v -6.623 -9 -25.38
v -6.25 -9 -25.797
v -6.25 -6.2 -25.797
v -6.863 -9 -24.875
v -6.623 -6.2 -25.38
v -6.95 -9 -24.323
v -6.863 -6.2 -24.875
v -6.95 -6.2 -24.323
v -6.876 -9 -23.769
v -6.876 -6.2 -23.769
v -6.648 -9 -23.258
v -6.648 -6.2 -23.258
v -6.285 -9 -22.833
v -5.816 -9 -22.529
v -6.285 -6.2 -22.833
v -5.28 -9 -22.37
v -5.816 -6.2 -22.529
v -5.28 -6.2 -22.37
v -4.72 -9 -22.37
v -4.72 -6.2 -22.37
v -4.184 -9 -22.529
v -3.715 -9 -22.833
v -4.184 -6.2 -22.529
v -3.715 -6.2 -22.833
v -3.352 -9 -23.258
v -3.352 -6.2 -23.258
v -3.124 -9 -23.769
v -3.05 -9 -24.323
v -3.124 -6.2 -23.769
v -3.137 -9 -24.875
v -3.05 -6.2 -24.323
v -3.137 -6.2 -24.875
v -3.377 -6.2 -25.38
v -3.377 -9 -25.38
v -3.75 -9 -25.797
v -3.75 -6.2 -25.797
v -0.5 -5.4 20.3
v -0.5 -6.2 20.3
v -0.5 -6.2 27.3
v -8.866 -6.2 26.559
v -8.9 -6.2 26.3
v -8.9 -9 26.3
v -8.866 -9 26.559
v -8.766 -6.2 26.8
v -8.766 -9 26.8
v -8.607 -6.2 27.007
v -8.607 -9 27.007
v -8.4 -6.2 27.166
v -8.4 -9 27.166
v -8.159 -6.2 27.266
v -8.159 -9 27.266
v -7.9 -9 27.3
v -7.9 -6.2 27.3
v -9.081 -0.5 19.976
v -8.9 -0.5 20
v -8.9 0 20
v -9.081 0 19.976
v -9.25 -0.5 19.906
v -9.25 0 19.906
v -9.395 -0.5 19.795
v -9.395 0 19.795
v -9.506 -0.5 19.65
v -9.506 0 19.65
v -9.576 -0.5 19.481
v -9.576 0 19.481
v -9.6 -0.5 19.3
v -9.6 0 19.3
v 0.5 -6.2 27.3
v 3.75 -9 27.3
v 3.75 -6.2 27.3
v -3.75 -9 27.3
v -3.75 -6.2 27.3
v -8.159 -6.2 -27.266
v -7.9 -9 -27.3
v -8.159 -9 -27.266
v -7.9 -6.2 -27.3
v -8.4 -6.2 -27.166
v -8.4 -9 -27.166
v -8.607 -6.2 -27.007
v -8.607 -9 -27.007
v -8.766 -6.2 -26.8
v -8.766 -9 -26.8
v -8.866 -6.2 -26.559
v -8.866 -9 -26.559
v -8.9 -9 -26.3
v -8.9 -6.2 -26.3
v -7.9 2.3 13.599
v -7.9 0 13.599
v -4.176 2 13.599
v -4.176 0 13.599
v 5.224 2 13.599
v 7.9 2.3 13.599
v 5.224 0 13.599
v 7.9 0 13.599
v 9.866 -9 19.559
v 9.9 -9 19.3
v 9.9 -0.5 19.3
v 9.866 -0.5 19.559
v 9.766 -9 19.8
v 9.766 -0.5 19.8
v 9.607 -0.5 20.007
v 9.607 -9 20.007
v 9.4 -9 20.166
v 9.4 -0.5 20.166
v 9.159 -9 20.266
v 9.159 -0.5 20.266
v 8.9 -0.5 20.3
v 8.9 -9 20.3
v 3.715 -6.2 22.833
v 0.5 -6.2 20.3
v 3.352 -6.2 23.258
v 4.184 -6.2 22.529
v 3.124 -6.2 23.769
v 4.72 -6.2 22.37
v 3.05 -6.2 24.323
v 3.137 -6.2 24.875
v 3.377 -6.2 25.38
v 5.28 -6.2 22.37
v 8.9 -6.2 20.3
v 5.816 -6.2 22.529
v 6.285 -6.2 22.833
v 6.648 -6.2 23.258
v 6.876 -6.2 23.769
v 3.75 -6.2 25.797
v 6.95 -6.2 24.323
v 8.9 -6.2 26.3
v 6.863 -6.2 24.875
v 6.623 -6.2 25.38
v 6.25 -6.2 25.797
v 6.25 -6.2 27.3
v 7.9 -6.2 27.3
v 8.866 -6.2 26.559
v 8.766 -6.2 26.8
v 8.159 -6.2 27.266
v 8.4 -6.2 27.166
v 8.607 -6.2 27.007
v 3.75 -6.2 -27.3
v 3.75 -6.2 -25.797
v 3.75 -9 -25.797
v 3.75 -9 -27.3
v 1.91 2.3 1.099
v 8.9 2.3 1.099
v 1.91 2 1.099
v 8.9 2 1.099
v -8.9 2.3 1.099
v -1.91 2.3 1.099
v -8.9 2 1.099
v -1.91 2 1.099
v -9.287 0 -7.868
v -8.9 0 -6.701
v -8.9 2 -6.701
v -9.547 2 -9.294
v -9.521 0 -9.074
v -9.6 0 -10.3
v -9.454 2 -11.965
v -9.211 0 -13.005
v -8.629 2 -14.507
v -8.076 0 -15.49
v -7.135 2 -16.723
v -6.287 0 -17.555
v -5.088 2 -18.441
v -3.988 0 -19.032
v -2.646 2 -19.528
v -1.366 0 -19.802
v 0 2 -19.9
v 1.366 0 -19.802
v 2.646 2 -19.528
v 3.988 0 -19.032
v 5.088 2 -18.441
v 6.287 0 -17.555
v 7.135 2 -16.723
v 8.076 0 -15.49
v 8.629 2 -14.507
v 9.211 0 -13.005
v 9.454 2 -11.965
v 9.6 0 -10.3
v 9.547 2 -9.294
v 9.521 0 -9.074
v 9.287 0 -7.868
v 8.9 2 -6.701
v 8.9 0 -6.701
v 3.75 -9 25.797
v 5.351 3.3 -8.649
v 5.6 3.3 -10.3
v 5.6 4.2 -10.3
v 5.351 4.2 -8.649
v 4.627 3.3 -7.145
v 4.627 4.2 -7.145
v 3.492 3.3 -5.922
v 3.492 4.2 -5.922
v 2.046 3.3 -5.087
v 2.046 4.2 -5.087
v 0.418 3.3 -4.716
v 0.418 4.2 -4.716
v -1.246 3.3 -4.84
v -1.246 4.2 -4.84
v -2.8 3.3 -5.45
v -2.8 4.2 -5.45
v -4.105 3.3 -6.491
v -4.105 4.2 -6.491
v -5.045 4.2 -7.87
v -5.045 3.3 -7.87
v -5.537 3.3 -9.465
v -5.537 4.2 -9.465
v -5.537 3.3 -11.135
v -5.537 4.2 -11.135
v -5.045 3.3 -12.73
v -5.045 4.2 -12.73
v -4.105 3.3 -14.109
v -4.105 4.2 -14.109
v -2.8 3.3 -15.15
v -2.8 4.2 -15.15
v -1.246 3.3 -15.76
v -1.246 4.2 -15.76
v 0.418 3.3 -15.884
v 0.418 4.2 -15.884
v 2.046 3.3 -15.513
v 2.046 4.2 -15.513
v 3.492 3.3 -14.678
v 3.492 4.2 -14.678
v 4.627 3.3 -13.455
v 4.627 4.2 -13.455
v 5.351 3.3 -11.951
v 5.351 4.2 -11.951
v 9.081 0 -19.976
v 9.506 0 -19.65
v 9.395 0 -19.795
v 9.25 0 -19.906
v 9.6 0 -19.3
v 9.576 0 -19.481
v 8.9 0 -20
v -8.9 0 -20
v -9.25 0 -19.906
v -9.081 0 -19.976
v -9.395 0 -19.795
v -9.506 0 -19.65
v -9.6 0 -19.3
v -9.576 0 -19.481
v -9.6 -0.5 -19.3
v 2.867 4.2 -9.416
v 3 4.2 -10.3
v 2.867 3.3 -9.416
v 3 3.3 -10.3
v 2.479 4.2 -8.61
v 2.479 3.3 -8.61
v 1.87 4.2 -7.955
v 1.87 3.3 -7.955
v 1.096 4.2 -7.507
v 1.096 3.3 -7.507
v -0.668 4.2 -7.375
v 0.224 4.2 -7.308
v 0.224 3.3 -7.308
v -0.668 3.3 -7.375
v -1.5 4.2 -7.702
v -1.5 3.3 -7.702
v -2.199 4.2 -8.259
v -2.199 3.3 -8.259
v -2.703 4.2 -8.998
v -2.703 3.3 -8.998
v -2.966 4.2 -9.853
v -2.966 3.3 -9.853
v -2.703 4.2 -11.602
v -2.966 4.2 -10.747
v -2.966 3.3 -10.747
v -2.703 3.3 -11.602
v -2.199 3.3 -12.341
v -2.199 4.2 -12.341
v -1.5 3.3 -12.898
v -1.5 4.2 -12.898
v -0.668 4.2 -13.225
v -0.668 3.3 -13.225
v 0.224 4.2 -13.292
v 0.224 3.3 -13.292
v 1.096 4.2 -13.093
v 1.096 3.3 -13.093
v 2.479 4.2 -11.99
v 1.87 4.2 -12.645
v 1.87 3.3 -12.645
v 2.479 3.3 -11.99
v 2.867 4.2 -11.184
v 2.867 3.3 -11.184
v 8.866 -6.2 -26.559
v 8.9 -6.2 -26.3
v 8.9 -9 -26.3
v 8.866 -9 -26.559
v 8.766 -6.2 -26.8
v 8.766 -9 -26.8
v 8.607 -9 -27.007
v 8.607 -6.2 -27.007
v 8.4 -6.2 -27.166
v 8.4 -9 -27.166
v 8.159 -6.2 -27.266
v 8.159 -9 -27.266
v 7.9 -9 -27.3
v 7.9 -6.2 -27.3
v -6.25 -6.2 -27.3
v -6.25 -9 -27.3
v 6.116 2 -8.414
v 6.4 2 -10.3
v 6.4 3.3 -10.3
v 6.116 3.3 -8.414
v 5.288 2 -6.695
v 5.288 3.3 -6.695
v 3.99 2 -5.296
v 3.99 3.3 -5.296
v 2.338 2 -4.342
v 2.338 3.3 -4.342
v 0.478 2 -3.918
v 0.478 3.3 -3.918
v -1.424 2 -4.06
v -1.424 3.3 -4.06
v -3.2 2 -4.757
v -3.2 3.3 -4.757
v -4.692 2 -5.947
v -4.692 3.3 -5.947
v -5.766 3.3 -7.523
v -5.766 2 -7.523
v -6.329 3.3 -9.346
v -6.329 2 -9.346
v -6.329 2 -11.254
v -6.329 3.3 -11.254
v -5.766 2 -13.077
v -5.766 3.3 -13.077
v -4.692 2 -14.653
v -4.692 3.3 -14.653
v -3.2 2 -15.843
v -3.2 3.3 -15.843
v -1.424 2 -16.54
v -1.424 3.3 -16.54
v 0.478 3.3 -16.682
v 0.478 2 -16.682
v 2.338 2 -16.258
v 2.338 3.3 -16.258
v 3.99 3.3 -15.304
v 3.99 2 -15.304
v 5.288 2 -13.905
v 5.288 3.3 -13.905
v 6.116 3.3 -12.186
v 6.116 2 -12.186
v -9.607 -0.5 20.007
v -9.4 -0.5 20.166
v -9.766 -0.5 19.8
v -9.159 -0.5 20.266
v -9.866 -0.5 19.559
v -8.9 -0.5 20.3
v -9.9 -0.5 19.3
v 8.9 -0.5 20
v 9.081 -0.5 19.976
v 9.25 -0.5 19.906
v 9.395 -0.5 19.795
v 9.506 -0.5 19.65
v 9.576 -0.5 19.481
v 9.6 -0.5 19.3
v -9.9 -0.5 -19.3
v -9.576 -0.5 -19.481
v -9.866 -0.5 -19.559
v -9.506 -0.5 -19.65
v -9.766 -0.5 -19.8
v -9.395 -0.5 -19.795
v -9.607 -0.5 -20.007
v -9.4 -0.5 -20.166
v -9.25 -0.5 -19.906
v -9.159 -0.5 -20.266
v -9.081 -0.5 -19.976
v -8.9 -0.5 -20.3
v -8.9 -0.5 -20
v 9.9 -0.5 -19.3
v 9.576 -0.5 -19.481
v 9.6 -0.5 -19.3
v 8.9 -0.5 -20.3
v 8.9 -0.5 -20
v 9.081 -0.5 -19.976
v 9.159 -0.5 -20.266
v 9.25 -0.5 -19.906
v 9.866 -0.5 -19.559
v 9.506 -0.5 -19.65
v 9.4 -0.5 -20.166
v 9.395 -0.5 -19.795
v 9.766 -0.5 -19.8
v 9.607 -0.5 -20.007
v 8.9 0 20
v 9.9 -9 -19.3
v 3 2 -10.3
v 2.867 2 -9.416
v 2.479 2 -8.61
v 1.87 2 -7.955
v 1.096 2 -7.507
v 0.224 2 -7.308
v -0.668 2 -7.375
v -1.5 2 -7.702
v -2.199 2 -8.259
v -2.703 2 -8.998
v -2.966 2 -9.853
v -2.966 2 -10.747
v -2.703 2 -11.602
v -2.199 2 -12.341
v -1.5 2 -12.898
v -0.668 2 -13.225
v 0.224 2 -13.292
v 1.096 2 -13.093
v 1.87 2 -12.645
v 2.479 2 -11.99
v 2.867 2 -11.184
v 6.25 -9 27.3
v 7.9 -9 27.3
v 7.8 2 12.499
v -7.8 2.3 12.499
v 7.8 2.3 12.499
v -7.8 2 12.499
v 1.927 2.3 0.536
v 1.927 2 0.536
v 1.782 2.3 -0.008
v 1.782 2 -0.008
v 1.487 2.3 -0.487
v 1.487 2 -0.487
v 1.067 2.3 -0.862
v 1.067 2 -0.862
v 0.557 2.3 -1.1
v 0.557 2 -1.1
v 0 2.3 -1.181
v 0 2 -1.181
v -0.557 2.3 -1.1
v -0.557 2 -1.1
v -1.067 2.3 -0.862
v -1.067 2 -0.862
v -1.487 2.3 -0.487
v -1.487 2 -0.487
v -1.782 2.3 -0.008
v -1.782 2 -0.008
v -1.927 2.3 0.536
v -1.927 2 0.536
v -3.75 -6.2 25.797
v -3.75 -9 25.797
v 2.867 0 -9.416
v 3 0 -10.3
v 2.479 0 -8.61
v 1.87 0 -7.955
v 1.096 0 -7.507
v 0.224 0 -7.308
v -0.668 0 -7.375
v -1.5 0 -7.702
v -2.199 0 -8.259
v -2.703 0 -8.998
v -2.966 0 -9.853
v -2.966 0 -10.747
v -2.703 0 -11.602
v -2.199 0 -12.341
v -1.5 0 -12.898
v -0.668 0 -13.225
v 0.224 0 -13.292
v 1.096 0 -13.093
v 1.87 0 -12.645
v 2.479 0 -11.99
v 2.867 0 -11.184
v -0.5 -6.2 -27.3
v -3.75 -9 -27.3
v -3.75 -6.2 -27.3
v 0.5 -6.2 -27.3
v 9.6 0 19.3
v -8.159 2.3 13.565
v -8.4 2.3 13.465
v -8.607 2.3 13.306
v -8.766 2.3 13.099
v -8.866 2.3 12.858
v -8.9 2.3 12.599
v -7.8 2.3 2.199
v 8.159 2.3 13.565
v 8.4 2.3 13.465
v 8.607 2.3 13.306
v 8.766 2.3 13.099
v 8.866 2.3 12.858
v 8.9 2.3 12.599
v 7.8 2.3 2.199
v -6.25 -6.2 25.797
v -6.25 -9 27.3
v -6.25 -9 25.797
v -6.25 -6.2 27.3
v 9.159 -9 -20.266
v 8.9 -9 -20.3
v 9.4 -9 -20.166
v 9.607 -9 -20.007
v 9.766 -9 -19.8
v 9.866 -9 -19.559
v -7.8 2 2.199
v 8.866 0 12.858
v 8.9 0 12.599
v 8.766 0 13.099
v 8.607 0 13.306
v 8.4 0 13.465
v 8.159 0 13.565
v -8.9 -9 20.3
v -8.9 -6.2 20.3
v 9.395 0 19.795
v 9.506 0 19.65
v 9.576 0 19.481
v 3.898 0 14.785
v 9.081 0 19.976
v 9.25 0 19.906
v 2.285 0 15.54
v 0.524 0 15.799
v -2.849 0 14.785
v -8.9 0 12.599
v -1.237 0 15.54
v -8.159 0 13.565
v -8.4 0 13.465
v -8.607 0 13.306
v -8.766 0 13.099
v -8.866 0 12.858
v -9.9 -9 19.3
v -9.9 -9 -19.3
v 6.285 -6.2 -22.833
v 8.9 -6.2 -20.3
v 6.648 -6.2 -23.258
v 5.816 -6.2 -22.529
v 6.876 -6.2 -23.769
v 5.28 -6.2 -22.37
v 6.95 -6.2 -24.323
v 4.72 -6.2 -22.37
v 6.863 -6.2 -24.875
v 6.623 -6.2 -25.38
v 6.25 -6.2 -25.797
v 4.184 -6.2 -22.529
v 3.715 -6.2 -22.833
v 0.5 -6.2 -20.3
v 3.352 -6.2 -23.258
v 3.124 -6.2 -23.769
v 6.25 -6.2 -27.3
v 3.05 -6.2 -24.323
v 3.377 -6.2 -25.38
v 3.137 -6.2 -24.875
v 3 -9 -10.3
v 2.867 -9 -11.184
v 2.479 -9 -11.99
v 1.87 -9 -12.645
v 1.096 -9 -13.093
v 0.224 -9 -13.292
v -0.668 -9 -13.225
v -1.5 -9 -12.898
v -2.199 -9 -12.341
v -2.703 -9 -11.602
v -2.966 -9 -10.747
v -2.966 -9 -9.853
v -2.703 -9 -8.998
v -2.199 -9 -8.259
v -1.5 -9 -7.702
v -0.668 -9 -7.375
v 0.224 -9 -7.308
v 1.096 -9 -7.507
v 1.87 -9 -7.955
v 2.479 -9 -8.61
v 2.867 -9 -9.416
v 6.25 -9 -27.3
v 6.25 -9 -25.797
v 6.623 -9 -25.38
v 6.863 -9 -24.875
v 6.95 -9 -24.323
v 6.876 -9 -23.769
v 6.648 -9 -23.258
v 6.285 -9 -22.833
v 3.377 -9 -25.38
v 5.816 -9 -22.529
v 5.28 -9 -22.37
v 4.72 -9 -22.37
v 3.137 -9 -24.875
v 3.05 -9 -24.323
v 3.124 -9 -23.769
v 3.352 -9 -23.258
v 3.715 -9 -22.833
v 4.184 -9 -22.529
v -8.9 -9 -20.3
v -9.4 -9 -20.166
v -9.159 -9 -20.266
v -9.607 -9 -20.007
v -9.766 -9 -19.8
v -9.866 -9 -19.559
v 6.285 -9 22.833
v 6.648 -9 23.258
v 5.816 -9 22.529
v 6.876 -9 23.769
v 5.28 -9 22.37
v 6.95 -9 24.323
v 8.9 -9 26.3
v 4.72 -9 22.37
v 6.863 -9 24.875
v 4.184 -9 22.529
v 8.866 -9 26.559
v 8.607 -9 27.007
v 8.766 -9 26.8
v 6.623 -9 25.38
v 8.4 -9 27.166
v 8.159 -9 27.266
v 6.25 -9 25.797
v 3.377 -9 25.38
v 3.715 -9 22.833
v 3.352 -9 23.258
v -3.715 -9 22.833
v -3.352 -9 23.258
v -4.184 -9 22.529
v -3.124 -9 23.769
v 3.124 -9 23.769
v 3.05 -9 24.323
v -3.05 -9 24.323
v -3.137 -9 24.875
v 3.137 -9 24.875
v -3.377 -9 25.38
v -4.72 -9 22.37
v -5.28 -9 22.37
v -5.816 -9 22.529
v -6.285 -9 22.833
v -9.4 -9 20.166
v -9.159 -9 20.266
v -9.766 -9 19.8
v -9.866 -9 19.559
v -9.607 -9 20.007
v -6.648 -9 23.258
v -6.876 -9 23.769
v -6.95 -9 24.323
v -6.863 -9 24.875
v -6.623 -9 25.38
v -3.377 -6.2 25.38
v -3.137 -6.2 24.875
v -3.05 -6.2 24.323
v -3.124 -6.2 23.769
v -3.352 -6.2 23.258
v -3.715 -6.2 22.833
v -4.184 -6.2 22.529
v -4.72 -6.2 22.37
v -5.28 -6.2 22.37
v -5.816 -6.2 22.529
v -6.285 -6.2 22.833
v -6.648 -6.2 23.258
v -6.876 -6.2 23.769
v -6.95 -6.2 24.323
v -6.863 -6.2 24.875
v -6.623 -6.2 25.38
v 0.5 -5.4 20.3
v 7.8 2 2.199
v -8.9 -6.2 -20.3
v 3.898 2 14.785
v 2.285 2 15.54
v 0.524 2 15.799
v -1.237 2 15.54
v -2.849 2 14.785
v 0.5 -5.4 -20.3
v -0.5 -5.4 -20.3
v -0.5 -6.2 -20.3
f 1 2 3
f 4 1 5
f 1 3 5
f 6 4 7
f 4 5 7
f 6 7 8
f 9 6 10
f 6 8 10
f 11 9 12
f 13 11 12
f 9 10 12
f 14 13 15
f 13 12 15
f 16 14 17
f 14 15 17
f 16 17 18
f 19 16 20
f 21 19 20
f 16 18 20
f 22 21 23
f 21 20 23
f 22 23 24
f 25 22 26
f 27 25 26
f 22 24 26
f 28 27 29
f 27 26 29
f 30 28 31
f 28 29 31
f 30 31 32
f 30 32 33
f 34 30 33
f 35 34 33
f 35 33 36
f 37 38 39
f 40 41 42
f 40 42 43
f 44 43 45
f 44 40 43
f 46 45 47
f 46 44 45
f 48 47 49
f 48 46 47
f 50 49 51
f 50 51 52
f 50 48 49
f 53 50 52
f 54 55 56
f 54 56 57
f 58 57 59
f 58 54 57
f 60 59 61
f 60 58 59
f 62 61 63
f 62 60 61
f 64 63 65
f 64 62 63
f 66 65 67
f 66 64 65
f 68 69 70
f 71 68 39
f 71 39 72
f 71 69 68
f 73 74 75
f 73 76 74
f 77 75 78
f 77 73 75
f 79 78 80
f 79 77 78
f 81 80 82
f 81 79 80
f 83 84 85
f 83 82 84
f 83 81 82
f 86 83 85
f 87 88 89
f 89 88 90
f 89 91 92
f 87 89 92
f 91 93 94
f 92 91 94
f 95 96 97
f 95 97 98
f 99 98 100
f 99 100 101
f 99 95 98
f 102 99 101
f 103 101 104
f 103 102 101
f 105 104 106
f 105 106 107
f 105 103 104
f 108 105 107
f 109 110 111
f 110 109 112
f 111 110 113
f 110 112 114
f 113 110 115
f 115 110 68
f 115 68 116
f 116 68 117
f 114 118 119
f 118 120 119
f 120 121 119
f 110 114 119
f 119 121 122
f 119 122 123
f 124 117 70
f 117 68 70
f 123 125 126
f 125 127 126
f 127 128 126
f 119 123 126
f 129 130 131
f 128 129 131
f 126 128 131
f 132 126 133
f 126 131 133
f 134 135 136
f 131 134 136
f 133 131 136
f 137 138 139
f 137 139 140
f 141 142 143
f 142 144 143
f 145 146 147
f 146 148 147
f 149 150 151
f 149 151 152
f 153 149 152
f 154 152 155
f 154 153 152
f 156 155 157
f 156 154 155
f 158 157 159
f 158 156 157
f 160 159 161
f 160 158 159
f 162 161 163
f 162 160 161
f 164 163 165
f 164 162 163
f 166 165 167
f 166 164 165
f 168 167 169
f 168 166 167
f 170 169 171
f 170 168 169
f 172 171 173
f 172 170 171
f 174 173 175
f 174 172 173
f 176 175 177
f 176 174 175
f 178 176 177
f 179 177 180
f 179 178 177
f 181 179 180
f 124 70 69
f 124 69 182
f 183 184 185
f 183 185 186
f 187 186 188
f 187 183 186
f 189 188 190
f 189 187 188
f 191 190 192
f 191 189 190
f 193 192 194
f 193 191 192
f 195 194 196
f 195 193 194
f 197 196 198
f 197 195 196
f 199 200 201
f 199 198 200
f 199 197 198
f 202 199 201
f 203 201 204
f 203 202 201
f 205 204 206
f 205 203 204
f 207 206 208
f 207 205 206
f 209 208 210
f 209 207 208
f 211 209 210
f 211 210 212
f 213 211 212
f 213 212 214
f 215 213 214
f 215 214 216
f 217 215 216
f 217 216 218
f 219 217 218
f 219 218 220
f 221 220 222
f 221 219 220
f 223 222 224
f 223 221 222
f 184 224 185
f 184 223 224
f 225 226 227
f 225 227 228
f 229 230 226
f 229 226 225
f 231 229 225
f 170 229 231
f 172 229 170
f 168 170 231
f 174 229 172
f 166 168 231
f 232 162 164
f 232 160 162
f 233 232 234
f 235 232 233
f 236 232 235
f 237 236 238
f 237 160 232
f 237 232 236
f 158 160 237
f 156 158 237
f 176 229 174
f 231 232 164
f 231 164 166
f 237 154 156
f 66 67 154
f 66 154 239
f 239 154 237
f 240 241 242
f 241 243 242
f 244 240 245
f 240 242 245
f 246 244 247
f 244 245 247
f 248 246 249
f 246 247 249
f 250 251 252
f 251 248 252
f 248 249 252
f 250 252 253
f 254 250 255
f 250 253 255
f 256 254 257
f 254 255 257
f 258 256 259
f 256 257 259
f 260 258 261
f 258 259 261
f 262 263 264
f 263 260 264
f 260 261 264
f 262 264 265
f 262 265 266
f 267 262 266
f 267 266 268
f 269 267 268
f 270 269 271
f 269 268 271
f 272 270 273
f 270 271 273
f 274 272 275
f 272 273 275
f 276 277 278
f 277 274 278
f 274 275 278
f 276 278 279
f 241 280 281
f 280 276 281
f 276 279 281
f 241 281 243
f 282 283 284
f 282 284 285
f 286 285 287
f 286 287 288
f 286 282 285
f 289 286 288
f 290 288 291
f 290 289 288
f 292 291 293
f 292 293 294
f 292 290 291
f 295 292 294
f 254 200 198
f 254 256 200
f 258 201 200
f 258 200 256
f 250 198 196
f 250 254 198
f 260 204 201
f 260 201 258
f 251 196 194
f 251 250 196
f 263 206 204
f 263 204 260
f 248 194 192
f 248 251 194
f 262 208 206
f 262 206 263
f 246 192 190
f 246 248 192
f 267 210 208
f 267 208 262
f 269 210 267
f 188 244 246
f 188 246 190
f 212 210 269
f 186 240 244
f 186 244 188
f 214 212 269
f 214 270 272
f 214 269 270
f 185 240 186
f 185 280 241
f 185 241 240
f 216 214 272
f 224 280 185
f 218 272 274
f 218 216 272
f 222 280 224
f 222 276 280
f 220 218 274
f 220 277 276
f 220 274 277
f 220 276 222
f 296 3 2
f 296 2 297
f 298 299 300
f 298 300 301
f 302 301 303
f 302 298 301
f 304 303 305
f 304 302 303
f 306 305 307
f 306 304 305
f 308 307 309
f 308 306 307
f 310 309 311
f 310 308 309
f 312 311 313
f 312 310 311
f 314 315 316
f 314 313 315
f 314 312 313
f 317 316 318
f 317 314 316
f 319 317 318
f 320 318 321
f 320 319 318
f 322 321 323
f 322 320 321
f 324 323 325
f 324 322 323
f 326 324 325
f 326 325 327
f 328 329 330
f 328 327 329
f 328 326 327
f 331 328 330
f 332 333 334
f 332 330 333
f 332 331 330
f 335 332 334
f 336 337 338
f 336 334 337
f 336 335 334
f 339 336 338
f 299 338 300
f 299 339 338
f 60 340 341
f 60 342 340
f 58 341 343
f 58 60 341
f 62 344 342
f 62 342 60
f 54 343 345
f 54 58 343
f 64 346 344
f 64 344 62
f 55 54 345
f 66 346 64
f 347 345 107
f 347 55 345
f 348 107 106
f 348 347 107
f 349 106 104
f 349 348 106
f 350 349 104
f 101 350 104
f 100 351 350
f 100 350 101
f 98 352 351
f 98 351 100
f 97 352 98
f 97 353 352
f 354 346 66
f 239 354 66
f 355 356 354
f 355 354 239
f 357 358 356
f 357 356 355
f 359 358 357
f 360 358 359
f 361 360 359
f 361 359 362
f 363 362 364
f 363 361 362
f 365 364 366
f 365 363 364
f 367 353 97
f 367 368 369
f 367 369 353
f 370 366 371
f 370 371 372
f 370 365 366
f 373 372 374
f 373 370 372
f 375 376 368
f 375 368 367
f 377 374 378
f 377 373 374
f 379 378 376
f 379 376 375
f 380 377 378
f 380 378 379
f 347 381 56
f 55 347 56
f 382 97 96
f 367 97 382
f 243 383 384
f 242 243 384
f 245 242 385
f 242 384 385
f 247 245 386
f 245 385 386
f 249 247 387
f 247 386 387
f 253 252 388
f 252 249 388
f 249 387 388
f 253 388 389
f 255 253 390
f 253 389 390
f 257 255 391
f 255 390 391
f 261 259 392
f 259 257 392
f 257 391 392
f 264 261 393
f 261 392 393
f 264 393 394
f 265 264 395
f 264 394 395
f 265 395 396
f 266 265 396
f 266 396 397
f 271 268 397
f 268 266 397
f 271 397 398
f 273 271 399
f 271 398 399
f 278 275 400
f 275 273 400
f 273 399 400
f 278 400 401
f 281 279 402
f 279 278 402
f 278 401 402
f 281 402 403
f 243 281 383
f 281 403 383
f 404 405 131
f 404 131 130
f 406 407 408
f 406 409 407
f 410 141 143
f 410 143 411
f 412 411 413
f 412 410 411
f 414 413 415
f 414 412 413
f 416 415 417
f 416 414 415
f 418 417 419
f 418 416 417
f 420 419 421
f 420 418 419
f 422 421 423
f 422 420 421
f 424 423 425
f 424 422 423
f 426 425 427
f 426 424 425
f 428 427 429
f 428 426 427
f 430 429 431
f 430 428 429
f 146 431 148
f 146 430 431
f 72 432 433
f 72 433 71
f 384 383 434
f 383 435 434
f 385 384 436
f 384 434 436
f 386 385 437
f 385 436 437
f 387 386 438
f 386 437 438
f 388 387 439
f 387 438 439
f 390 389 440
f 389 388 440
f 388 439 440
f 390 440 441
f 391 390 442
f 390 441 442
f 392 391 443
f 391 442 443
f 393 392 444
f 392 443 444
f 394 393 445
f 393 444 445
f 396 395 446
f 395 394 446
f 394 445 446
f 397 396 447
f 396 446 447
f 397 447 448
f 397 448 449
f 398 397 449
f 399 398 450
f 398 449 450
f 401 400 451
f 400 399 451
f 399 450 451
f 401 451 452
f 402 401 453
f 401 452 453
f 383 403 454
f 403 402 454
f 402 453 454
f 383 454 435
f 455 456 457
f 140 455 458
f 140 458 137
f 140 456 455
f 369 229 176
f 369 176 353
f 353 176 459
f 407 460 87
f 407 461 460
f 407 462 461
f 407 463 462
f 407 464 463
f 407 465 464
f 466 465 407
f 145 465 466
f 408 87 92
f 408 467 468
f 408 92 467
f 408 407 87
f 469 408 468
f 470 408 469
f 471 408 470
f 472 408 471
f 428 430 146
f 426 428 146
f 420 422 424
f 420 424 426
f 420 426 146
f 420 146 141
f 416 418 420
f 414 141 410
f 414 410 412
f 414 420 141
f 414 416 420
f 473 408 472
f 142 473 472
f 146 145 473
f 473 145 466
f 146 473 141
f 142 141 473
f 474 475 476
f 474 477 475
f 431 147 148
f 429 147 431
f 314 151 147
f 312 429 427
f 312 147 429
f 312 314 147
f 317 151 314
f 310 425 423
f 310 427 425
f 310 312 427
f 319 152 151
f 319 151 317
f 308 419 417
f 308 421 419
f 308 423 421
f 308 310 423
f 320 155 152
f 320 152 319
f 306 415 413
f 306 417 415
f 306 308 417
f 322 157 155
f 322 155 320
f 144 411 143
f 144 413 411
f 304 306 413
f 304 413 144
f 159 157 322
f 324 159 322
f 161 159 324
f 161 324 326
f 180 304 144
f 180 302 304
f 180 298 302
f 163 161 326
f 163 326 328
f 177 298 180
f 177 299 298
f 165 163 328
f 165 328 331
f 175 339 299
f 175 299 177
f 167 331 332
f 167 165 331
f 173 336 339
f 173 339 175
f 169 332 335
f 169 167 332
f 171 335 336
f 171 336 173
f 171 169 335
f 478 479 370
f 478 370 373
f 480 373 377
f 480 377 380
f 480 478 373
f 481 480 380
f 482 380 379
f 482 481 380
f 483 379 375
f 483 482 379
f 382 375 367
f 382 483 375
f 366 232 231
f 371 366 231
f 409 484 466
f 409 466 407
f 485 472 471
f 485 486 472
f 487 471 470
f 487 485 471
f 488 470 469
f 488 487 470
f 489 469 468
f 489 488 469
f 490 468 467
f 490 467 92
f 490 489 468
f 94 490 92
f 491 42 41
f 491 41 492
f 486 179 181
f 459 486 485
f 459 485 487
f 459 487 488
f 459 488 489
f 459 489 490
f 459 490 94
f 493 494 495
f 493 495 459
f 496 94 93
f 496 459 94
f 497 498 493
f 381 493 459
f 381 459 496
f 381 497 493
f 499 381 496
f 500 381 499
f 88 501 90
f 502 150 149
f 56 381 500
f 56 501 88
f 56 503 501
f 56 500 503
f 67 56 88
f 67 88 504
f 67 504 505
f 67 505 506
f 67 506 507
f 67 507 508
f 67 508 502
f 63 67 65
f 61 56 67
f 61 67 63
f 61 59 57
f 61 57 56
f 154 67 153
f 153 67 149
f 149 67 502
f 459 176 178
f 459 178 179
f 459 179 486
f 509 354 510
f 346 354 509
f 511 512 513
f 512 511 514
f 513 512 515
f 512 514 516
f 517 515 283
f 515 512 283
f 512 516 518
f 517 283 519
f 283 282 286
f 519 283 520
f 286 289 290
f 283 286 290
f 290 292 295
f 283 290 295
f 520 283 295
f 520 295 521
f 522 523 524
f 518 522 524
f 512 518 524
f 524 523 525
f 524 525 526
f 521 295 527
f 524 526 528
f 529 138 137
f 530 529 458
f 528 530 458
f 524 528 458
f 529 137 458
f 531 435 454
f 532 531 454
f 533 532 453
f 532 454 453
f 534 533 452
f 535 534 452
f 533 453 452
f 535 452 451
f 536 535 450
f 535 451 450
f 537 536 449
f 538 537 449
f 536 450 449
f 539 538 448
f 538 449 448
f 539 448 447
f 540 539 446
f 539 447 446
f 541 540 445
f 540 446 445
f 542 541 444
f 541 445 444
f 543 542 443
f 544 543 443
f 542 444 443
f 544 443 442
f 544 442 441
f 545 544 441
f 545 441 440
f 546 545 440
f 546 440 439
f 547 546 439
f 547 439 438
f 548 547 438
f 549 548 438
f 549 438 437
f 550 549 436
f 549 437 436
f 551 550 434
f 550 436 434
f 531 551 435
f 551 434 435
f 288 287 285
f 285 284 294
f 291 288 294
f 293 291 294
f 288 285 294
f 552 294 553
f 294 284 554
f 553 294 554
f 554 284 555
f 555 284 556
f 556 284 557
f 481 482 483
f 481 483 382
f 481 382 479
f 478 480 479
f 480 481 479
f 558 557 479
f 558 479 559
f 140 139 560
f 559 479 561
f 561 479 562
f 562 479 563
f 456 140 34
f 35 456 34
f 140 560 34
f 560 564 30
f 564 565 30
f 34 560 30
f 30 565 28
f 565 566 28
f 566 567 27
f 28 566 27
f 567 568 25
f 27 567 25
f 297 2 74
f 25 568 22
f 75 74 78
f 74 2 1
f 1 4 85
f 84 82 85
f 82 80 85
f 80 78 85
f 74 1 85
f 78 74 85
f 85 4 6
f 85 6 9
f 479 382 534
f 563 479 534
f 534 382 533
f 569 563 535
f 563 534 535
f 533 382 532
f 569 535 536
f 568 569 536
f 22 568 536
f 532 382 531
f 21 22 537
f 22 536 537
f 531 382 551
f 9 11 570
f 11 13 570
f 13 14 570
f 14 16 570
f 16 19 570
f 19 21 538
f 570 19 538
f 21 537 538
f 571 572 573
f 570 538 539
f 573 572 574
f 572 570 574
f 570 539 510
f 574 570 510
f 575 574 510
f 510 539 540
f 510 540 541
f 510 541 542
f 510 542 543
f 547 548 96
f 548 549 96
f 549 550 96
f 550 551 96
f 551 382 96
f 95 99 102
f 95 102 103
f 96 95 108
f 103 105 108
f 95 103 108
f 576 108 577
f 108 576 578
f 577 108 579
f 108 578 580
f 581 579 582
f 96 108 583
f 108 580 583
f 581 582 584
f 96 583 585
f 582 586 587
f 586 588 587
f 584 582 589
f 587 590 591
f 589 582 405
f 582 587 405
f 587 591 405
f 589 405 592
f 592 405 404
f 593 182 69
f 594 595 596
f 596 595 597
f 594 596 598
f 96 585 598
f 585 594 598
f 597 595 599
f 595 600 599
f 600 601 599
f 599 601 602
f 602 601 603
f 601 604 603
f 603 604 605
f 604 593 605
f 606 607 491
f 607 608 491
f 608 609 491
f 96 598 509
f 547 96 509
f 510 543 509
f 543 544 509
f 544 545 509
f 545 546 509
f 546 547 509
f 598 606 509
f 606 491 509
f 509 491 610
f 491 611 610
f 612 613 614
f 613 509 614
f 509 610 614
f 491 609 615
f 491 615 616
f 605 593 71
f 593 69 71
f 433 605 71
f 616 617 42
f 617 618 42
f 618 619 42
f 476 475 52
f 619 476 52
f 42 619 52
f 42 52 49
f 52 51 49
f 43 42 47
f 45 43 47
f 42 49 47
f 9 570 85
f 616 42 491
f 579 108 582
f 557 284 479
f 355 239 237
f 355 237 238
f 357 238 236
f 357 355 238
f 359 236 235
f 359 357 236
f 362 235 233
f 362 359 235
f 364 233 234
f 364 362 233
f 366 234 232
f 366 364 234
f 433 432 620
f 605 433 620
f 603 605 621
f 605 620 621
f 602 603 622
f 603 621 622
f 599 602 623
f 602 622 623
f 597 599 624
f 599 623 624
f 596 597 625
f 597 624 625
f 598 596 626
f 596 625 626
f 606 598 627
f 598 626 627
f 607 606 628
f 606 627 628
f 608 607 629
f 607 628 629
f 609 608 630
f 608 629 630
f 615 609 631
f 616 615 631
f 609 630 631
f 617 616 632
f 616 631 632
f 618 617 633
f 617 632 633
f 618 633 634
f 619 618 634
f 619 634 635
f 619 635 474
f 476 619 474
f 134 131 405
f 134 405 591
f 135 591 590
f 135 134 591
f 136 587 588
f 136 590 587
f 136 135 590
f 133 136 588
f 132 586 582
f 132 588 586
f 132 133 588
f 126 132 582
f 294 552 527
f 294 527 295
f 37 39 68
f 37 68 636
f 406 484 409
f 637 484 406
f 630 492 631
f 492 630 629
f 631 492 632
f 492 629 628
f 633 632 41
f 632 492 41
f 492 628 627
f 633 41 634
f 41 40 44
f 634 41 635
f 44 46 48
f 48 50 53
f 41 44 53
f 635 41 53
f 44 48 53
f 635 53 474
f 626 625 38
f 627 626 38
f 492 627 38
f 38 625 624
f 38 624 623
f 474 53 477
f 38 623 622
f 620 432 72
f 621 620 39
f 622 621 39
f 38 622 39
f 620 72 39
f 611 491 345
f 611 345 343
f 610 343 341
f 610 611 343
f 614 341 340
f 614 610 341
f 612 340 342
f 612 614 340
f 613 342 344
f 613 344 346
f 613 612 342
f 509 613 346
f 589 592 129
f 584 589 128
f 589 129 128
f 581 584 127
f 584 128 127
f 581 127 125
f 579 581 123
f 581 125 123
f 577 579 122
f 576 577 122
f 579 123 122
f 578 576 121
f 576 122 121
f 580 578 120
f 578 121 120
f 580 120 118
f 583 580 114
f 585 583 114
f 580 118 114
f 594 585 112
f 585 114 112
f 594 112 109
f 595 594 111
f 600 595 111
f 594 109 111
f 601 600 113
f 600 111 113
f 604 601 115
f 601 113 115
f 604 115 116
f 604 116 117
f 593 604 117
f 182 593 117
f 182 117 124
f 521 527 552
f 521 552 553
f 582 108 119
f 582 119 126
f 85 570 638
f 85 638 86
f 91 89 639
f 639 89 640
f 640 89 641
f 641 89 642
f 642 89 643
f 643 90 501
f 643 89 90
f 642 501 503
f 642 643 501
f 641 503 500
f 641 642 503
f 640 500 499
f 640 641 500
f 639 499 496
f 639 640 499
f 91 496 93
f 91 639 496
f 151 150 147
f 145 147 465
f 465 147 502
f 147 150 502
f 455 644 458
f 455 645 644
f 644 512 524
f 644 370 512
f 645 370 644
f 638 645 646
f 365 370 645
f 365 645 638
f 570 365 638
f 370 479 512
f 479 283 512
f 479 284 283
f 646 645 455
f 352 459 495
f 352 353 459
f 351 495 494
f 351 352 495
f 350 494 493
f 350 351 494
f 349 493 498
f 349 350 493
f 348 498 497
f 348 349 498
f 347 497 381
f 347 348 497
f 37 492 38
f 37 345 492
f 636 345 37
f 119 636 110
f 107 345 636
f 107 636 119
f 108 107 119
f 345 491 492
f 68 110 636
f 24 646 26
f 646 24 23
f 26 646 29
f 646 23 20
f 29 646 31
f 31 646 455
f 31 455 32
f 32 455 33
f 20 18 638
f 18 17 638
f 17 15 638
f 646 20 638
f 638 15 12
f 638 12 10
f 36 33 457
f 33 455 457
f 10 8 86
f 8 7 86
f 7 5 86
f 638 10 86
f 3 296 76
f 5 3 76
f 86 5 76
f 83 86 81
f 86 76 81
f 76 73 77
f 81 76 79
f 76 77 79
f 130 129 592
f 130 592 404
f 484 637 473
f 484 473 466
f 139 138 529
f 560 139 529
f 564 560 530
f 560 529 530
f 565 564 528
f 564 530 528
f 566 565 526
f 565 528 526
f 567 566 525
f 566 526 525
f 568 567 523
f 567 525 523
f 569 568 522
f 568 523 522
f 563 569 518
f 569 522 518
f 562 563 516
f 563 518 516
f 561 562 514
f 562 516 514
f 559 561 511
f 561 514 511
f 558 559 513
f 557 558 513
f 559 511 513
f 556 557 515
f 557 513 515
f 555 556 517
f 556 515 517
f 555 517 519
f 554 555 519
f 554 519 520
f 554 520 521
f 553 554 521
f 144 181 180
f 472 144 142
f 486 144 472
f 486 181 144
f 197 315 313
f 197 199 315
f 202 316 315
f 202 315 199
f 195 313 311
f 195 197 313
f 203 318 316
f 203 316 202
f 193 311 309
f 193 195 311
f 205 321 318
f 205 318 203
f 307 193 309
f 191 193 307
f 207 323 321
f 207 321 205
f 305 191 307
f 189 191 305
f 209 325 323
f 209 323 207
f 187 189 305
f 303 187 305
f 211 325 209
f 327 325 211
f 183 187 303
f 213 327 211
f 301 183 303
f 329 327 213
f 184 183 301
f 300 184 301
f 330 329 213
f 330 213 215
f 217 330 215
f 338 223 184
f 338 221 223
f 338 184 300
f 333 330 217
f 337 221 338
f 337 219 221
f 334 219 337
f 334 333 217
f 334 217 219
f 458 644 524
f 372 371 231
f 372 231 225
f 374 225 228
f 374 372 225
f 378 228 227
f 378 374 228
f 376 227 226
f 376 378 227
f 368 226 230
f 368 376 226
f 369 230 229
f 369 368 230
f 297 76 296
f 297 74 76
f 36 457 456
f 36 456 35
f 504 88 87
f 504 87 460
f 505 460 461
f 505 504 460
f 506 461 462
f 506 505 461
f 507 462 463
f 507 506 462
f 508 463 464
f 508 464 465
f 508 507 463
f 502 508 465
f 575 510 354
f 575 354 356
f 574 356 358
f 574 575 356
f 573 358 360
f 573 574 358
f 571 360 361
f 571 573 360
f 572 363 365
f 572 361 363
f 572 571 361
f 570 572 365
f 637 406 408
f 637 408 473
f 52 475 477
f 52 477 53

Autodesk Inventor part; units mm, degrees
ref_plane "YZ Plane" through (0, 0, 0) normal (1, 0, 0) x (0, 1, 0)
ref_plane "XZ Plane" through (0, 0, 0) normal (0, 1, 0) x (-1, 0, 0)
ref_plane "XY Plane" through (0, 0, 0) normal (0, 0, 1) x (1, 0, 0)
sketch "Boceto1" plane through (0, 0, 0) normal (0, 1, 0) x (-1, 0, 0)
  line L0 (9.9, 20.3) -> (-9.9, 20.3)
  line L1 (-9.9, 20.3) -> (-9.9, -20.3)
  line L2 (-9.9, -20.3) -> (9.9, -20.3)
  line L3 (9.9, -20.3) -> (9.9, 20.3)
  line L4 (9.9, 20.3) -> (-9.9, -20.3) construction
  line L5 (-9.9, 20.3) -> (9.9, -20.3) construction
  point P0 (0, 0)
  dimension "d0" = 19.8
  dimension "d1" = 40.6
extrude "Extrusión1" add sketch "Boceto1" against normal blind 9
sketch "Boceto2" plane through (0, 0, 0) normal (0, 1, 0) x (1, 0, 0)
  circle A0 centre (0, 10.3) radius 3
  line L0 (9.9, 20.3) -> (-9.9, 20.3) projected
  point P0 (0, 0)
  dimension "d4" = 6
  dimension "d5" = 10
extrude "Extrusión2" cut sketch "Boceto2" against normal through all
sketch "Boceto5" plane through (0, -9, 0) normal (0, -1, 0) x (1, 0, 0)
  line L0 (-8.9, 20.3) -> (8.9, 20.3)
  line L1 (8.9, 20.3) -> (8.9, 27.3)
  line L2 (8.9, 27.3) -> (-8.9, 27.3)
  line L3 (-8.9, 27.3) -> (-8.9, 20.3)
  line L4 (-8.9, 20.3) -> (8.9, 27.3) construction
  line L5 (8.9, 20.3) -> (-8.9, 27.3) construction
  line L6 (-9.9, 27.3) -> (9.9, 27.3)
  line L7 (9.9, 20.3) -> (-9.9, 20.3) projected
  point P0 (0, 0)
  point P1 (0, 0)
  point P2 (0, 23.8)
  dimension "d23" = 17.8
  dimension "d24" = 7
extrude "Extrusión5" add sketch "Boceto5" against normal blind 2.8
sketch "Boceto6" plane through (0, -6.2, 0) normal (0, 1, 0) x (1, 0, 0)
  arc A0 (-3.75, -25.7967) -> (-6.25, -25.7967) centre (-5, -24.3) ccw
  line L0 (-8.9, -27.3) -> (8.9, -27.3)
  line L1 (-3.75, -27.3) -> (-6.25, -27.3)
  line L2 (-6.25, -27.3) -> (-6.25, -25.7967)
  line L3 (-3.75, -25.7967) -> (-3.75, -27.3)
  line L4 (0, -27.3) -> (0, -23.9124)
  line L5 (-8.9, -20.3) -> (-8.9, -27.3)
  line L6 (-8.9, -20.3) -> (8.9, -20.3) projected
  line L7 (-8.3229, -20.3) -> (8.9, -20.3)
  line L8 (8.9, -20.3) -> (8.9, -27.3)
  point P0 (0, 0)
  point P1 (0, 0)
  dimension "d27" = 3.9
  dimension "d28" = 3
  dimension "d29" = 5
  dimension "d75" = 1.25
  dimension "d76" = 1.25
extrude "Extrusión6" cut sketch "Boceto6" against normal through all contours L3 L0 L2 A0
sketch "Boceto8" plane through (0, 0, 0) normal (1, 0, 0) x (0, 1, 0)
  line L0 (-6.2, 27.3) -> (-5.4, 20.3)
  line L1 (-5.4, 20.3) -> (-6.2, 20.3)
  line L2 (-6.2, 20.3) -> (-6.2, 27.3)
  point P0 (0, 0)
  dimension "d34" = 0.8
extrude "Extrusión7" add sketch "Boceto8" along normal mid plane 1
mirror "Simetría3" about plane through (0, 0, 0) normal (1, 0, 0) of "Extrusión6"
mirror "Simetría4" about plane through (0, 0, 0) normal (0, 0, 1) of "Extrusión5", "Extrusión6", "Simetría3", "Extrusión7"
sketch "Boceto9" plane through (0, 0, 0) normal (0, 1, 0) x (1, 0, 0)
  circle A0 centre (0, 10.3) radius 3 projected
  line L0 (-8.9, -13.5986) -> (8.9, -13.5986)
  line L1 (8.9, -13.5986) -> (8.9, 6.7014)
  line L2 (-8.9, 6.7014) -> (-8.9, -13.5986)
  line L3 (-8.9, -13.5986) -> (5.885, 8.9919) construction
  line L4 (8.9, -13.5986) -> (-5.885, 8.9919) construction
  arc A1 (8.9, 6.7014) -> (-8.9, 6.7014) centre (0, 10.3) ccw
  line L5 (9.9, 20.3) -> (-9.9, 20.3) projected
  point P0 (0, 0)
  dimension "d40" = 9.6
  dimension "d42" = 20.3
  dimension "d61" = 17.8
extrude "Extrusión8" add sketch "Boceto9" along normal blind 2
sketch "Boceto11" plane through (0, 2, 0) normal (0, 1, 0) x (1, 0, 0)
  line L0 (-8.9, -13.5986) -> (8.9, -13.5986) projected
  line L1 (5.2244, -15.7986) -> (5.2244, -13.5986)
  arc A0 (-4.1756, -13.5986) -> (5.2244, -13.5986) centre (0.5244, -9.6782) ccw
  line L2 (-4.1756, -13.5986) -> (5.2244, -13.5986)
  point P0 (0, 0)
  dimension "d50" = 2.2
  dimension "d51" = 9.4
extrude "Extrusión9" add sketch "Boceto11" against normal blind 2
sketch "Boceto12" plane through (0, 2, 0) normal (0, 1, 0) x (1, 0, 0)
  circle A0 centre (0, 10.3) radius 6.4
  circle A1 centre (0, 10.3) radius 3 projected
  point P0 (0, 0)
  dimension "d54" = 12.8
extrude "Extrusión10" add sketch "Boceto12" along normal blind 1.3
sketch "Boceto13" plane through (0, 3.3, -10.3) normal (0, 1, 0) x (1, 0, 0)
  circle A0 centre (0, 0) radius 5.6
  circle A1 centre (0, 0) radius 3 projected
  point P0 (0, -10.3)
  dimension "d57" = 11.2
extrude "Extrusión11" add sketch "Boceto13" along normal blind 0.9
sketch "Boceto15" plane through (0, 2, 0) normal (0, 1, 0) x (1, 0, 0)
  line L0 (8.9, 6.7014) -> (8.9, -13.5986) projected
  line L1 (-8.9, -13.5986) -> (8.9, -13.5986)
  line L2 (8.9, -13.5986) -> (8.9, -1.0986)
  line L3 (8.9, -1.0986) -> (-8.9, -1.0986)
  line L4 (-8.9, -1.0986) -> (-8.9, -13.5986)
  line L5 (-8.9, -13.5986) -> (8.9, -1.0986) construction
  line L6 (8.9, -13.5986) -> (-8.9, -1.0986) construction
  line L7 (-8.9, -13.5986) -> (-4.1756, -13.5986) projected
  line L8 (-7.8, -12.4986) -> (7.8, -12.4986)
  line L9 (7.8, -12.4986) -> (7.8, -2.1986)
  line L10 (7.8, -2.1986) -> (-7.8, -2.1986)
  line L11 (-7.8, -2.1986) -> (-7.8, -12.4986)
  point P0 (0, 0)
  point P1 (0, -7.3486)
  dimension "d62" = 12.5
  dimension "d63" = 1.1
extrude "Extrusión12" add sketch "Boceto15" along normal blind 0.3
sketch "Boceto16" plane through (0, 2.3, 0) normal (0, 1, 0) x (1, 0, 0)
  arc A0 (1.91, -1.0986) -> (-1.91, -1.0986) centre (0, -0.7586) ccw
  line L0 (-7.8, -2.1986) -> (7.8, -2.1986) projected
  line L1 (8.9, -1.0986) -> (-8.9, -1.0986) projected
  point P0 (0, 0)
  dimension "d66" = 3.88
  dimension "d67" = 1.44
extrude "Extrusión13" add sketch "Boceto16" against normal blind 0.3
sketch "Boceto17" plane through (0, 0, 0) normal (0, 1, 0) x (1, 0, 0)
  line L0 (-9.9, 20.3) -> (-9.9, -20.3) projected
  line L1 (9.9, -20.3) -> (9.9, 20.3) projected
  line L2 (-9.9, -20.3) -> (9.9, -20.3) projected
  line L3 (9.9, 20.3) -> (-9.9, 20.3) projected
  line L4 (-9.6, -20) -> (-9.6, 20)
  line L5 (-9.6, 20) -> (9.6, 20)
  line L6 (9.6, 20) -> (9.6, -20)
  line L7 (9.6, -20) -> (-9.6, -20)
  point P0 (0, 0)
  dimension "d70" = 0.3
extrude "Extrusión14" cut sketch "Boceto17" against normal blind 0.5
fillet "Empalme1" radius 1 10 edges at (9.9, -4.75, 20.3) (8.9, -7.6, 27.3) (-8.9, -7.6, 27.3) (-9.9, -4.75, 20.3) (8.9, 1.15, 13.5986) (-8.9, 1.15, 13.5986) (9.9, -4.75, -20.3) (-9.9, -4.75, -20.3) (-8.9, -7.6, -27.3) (8.9, -7.6, -27.3)
fillet "Empalme2" radius 0.7 4 edges at (9.6, -0.25, 20) (-9.6, -0.25, 20) (9.6, -0.25, -20) (-9.6, -0.25, -20)
sketch "Boceto18" plane through (0, 2, 0) normal (0, 1, 0) x (1, 0, 0)
  point P0 (0, 0)
equation "\"d76\" = d75"
properties part number "Top" material "Plástico ABS"
